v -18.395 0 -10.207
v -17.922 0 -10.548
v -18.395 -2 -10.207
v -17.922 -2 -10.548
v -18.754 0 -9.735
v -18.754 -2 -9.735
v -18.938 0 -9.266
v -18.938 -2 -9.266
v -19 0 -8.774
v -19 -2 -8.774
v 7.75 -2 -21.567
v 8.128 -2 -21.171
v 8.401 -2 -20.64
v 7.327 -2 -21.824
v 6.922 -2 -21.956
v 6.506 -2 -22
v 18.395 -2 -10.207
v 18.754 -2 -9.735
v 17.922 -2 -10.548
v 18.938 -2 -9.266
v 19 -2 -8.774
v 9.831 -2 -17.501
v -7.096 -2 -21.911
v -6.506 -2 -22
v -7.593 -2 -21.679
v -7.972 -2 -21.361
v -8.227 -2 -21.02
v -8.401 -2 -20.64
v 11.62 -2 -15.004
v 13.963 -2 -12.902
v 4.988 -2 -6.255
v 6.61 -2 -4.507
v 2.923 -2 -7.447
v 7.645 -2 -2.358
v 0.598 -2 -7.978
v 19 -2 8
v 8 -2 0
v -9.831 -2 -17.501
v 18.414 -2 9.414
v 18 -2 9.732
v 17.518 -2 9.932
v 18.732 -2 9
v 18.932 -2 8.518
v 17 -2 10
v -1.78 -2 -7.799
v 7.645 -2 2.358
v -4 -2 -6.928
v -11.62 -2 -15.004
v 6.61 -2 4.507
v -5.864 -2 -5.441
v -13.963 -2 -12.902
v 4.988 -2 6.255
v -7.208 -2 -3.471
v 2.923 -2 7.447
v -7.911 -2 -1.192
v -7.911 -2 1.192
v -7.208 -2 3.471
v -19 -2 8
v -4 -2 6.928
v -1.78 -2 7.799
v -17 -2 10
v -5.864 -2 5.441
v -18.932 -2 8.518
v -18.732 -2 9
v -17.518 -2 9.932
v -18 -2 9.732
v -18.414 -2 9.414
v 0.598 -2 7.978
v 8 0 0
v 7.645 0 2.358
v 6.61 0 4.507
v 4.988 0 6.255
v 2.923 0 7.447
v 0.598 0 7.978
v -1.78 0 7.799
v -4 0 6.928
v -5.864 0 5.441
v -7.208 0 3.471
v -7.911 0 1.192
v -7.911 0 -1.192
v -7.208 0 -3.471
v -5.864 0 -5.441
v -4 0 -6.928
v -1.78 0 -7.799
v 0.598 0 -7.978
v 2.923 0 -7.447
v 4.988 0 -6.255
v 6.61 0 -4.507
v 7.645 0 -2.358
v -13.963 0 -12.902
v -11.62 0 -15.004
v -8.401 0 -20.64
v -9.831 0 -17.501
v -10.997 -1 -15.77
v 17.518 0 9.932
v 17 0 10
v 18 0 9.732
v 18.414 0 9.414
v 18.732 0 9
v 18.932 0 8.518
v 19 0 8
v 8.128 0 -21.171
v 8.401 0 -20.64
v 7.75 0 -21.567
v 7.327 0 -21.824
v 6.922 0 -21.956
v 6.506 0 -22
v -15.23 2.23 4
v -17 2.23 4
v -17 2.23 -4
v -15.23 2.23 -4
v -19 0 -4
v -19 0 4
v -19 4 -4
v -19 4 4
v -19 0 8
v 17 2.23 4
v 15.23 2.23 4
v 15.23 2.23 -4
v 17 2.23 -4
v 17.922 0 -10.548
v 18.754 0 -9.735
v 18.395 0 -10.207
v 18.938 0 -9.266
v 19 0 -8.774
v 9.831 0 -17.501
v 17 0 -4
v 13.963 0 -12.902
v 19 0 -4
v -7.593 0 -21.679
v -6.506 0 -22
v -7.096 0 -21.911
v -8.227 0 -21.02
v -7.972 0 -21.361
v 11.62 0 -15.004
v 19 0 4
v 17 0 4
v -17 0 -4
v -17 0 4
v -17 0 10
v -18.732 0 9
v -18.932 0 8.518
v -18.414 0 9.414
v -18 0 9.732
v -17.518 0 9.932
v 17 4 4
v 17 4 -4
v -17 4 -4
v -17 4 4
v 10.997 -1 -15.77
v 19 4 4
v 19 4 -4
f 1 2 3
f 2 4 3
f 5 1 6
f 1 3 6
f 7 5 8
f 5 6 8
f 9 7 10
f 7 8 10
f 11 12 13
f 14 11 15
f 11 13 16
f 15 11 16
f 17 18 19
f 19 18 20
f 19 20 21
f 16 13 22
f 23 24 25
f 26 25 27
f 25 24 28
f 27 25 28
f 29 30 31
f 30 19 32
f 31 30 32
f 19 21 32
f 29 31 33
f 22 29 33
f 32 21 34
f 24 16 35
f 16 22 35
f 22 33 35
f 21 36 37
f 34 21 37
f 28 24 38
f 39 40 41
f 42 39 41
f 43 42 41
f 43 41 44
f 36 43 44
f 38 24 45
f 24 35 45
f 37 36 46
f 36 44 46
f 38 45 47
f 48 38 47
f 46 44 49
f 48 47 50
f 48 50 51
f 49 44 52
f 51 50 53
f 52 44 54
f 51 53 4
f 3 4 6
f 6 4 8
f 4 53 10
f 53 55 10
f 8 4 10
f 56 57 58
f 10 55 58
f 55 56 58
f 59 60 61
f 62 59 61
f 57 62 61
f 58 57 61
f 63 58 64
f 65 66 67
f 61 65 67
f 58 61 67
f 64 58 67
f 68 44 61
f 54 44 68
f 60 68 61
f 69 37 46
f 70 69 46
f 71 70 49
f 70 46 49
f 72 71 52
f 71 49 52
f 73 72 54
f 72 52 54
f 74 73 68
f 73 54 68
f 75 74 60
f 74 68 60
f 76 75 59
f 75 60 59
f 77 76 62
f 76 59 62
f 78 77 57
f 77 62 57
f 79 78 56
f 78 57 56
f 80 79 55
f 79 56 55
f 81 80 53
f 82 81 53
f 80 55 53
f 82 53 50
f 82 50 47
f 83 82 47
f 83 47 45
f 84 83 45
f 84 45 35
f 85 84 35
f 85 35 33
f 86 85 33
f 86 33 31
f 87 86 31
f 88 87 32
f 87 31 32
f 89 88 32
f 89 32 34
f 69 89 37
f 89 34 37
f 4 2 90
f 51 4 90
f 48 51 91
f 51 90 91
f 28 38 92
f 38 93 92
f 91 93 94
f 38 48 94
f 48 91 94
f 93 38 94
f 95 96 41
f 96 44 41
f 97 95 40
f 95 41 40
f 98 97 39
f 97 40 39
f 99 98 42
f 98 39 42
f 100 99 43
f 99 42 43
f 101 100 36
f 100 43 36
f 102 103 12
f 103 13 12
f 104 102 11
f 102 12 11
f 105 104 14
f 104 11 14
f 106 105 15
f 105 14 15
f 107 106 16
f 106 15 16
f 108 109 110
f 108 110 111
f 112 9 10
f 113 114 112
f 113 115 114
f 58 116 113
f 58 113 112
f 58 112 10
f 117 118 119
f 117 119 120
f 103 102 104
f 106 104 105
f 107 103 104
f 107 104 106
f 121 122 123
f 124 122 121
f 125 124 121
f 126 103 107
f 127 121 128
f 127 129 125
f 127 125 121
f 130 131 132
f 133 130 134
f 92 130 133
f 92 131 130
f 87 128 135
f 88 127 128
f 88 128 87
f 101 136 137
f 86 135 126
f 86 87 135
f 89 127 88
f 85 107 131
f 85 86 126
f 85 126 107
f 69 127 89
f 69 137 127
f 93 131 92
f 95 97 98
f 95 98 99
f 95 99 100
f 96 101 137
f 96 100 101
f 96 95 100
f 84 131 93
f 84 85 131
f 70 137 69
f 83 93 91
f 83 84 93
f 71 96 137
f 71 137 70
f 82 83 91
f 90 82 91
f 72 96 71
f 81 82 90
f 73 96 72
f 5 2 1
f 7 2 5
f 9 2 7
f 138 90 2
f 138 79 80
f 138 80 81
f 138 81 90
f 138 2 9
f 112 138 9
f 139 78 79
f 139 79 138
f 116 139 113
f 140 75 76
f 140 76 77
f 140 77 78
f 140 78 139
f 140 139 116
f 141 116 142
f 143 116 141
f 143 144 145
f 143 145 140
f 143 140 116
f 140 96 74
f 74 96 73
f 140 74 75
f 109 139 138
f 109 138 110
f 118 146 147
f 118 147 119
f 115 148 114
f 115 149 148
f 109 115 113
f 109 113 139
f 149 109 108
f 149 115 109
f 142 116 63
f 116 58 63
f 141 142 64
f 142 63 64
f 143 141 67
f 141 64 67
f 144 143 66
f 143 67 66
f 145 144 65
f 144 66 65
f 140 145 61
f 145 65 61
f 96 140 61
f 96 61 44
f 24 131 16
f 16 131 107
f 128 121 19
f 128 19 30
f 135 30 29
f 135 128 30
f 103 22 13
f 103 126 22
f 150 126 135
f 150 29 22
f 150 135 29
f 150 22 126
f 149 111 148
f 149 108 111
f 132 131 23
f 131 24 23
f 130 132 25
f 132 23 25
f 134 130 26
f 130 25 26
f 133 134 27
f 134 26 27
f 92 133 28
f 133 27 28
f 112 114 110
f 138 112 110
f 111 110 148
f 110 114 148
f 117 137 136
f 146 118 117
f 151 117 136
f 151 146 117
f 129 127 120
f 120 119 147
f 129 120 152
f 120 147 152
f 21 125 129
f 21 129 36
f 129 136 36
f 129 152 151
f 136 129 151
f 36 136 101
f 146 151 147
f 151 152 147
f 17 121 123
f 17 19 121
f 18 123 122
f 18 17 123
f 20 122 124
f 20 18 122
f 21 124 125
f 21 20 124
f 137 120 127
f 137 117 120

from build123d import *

# Parameters (mm, degrees)
F0_W          = 38
F0_H          = 20
F1_DEPTH      = 2
F2_R          = 2
F3_R          = 8
F4_DEPTH      = 2
F6_DEPTH      = 4
F6_DEPTH_BACK = 4


with BuildPart() as f1:
    # F0 (on Front) → F1 (new body)
    with BuildSketch(Plane.XZ):
        with BuildLine():
            add(Edge.make_bspline(
                [(19, -10), (14.1880401769, -12.4002225701), (11.0551596639, -15.0185183176), (8.6638560302, -19.389195231), (8, -22)],
                knots=[0, 0, 0, 0, 0.5443359888, 1, 1, 1, 1], degree=3))
            Line((19, -10), (-19, -10))
            add(Edge.make_bspline(
                [(-19, -10), (-14.1880401769, -12.4002225701), (-11.0551596639, -15.0185183176), (-8.6638560302, -19.389195231), (-8, -22)],
                knots=[0, 0, 0, 0, 0.5443359888, 1, 1, 1, 1], degree=3))
            Line((-8, -22), (0, -22))
            Line((0, -22), (8, -22))
        make_face()
        Rectangle(F0_W, F0_H)
    extrude(amount=F1_DEPTH)

    # F2
    f2_edges = [f1.edges().sort_by_distance(p)[0] for p in [
        (-19, -1, 10),
        (19, -1, 10),
        (-8, -1, -22),
        (8, -1, -22),
        (-19, -1, -10),
        (19, -1, -10),
    ]]
    fillet(f2_edges, radius=F2_R)

    # F3 (on face) → F4 (cut, through all)
    with BuildSketch(Plane.XZ.offset(2)):
        Circle(F3_R)
    extrude(amount=-F4_DEPTH, mode=Mode.SUBTRACT)

    # F5 (on Top) → F6 (join, two sides)
    with BuildSketch(Plane.XY) as f6_sk:
        Polygon((-19, 4), (-19, 0), (-17, 0), (-17, 2.2302730472), (-15.2302730472, 2.2302730472), (-17, 4), align=None)
        Polygon((17, 0), (19, 0), (19, 4), (17, 4), (15.2302730472, 2.2302730472), (17, 2.2302730472), align=None)
    extrude(amount=F6_DEPTH)
    extrude(f6_sk.sketch, amount=-F6_DEPTH_BACK)


solid = f1.part
